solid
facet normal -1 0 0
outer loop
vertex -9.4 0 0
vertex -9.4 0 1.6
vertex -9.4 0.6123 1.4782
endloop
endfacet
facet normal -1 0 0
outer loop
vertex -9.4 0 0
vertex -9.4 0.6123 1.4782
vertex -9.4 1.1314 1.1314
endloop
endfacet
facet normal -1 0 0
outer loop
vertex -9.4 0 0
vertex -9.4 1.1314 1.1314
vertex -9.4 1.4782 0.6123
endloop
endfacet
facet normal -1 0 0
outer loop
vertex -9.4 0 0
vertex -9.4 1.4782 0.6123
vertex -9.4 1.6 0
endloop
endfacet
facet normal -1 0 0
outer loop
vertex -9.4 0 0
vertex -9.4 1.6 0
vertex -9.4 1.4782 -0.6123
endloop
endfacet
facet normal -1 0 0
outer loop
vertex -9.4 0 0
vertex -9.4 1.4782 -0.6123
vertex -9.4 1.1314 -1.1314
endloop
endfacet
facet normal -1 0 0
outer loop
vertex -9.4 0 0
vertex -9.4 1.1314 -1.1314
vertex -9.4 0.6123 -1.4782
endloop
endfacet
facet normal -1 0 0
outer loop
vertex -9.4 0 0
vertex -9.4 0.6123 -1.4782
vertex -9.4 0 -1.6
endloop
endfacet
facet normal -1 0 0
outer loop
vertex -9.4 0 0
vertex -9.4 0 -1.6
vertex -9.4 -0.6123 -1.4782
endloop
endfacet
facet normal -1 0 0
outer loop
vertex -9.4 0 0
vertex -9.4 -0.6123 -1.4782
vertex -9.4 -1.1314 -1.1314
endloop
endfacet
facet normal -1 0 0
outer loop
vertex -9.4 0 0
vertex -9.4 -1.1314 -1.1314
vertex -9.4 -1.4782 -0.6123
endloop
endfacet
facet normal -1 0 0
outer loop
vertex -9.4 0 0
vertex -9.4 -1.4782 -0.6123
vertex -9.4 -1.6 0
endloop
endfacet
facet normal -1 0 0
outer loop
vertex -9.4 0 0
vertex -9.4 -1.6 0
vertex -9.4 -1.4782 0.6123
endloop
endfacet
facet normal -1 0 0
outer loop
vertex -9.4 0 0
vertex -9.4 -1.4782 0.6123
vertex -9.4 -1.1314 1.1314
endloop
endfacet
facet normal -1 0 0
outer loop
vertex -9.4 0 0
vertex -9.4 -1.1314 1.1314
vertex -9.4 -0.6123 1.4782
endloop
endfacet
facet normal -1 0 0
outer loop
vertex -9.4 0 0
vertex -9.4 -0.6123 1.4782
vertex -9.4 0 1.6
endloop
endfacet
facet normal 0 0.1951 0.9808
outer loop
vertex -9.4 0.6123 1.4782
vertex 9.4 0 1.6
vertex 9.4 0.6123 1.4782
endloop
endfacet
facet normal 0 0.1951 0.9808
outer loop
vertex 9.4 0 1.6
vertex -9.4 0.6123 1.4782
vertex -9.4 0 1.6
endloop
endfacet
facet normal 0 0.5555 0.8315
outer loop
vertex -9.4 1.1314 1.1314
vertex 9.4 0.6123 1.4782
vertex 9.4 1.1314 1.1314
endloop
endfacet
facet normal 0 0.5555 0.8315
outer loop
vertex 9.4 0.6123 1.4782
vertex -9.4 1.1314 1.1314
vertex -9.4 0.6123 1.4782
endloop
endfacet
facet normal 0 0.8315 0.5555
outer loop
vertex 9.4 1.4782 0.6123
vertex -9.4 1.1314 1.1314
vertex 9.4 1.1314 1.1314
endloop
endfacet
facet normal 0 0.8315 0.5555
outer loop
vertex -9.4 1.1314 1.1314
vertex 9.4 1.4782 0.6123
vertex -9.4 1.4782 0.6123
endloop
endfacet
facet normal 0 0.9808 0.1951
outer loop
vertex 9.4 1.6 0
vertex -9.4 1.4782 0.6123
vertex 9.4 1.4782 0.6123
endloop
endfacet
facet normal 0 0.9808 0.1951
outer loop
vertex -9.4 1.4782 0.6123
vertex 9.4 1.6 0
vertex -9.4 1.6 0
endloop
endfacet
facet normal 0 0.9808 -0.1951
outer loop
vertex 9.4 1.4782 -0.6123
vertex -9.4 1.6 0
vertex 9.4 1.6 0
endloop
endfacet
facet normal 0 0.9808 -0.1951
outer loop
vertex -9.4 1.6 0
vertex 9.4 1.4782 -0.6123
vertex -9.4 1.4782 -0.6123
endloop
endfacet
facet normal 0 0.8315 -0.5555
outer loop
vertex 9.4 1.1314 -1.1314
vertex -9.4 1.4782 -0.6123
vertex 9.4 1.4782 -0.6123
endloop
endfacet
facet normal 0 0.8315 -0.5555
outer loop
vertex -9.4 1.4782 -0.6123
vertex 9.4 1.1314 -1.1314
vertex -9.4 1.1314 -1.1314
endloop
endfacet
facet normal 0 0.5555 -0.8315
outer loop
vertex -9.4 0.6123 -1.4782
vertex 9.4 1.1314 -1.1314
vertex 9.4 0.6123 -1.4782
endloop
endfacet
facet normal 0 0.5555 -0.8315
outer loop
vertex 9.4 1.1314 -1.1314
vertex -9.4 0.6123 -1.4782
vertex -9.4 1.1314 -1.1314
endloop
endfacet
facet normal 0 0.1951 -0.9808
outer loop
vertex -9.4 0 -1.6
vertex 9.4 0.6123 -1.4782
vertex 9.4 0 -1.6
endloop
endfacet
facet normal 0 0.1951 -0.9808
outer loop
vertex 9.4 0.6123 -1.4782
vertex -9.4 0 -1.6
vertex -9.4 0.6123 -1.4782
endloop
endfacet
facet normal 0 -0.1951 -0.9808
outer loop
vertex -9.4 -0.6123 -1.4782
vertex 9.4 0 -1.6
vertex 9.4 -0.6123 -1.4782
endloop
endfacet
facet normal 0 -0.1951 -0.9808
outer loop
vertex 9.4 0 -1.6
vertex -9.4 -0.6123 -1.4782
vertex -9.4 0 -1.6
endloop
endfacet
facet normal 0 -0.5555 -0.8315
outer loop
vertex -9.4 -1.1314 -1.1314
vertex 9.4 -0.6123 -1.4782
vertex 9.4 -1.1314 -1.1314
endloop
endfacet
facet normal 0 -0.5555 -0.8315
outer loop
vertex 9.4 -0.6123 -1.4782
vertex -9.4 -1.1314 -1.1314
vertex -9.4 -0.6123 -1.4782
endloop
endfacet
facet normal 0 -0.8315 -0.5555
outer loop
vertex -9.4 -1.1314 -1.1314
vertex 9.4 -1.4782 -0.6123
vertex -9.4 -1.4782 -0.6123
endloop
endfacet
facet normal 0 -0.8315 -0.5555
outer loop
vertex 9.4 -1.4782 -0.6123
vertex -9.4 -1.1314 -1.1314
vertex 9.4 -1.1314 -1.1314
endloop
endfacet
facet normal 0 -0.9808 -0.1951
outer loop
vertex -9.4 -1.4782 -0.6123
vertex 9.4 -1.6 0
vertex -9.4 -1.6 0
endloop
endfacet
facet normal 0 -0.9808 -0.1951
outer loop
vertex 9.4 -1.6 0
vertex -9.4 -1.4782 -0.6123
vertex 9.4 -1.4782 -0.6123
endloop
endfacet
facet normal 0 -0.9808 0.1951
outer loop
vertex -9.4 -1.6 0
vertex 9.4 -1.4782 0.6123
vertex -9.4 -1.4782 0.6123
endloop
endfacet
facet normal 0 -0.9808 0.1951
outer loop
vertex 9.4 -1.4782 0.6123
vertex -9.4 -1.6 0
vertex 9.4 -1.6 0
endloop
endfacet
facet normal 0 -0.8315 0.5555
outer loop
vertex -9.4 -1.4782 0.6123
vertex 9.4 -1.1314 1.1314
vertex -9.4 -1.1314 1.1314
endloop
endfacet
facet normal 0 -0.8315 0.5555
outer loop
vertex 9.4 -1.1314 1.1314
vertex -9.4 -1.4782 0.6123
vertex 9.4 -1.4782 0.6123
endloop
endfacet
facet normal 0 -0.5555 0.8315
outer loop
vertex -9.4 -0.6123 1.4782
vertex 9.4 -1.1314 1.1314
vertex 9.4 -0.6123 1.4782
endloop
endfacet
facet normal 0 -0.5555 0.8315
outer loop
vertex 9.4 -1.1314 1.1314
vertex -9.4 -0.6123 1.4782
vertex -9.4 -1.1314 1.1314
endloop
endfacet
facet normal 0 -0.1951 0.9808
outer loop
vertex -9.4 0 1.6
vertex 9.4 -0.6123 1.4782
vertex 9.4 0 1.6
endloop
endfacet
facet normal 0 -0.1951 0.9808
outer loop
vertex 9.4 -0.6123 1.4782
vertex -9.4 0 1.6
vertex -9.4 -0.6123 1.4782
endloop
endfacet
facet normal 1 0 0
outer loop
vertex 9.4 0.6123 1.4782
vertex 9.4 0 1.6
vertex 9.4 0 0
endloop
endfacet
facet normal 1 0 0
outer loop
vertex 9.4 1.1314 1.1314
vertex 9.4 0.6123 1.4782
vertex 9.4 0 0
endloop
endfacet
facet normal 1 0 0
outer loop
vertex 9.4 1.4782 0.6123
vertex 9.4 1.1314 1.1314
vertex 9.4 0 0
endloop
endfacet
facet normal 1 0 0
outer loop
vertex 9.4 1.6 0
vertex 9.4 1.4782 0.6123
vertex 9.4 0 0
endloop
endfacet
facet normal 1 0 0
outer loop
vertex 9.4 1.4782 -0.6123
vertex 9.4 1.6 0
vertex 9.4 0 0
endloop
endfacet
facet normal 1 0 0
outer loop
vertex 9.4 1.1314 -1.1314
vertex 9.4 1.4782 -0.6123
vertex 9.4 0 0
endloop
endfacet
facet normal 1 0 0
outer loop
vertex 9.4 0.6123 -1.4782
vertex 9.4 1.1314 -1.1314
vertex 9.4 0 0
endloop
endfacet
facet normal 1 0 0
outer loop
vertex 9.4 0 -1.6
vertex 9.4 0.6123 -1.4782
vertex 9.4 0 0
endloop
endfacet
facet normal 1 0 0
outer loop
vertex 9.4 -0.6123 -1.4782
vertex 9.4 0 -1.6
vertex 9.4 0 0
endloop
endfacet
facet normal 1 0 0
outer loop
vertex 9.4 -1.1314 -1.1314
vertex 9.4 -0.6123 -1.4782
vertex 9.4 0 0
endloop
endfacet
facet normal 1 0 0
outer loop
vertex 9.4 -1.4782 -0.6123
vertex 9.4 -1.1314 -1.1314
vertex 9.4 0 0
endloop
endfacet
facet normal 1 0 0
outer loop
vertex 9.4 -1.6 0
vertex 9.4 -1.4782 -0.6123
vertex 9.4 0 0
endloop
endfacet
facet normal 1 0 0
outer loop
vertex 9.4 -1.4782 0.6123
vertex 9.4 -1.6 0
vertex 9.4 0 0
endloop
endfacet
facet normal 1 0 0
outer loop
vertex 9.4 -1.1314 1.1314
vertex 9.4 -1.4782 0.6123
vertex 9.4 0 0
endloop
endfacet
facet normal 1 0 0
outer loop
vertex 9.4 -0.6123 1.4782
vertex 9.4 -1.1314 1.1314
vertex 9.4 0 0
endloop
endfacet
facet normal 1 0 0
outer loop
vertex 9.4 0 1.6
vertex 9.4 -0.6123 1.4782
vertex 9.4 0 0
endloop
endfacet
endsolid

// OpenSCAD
// file: ../p/4-4edge.scad
use <../lib.scad>
function ldraw_lib__4_4edge() = [
// 0 Circle 1.0
// 0 Name: 4-4edge.dat
// 0 Author: James Jessiman
// 0 !LDRAW_ORG Primitive UPDATE 2017-01
// 0 !LICENSE Licensed under CC BY 4.0 : see CAreadme.txt
// 
// 0 BFC CERTIFY CCW
  [0,"BFC","CERTIFY"],
  [0,"BFC","CCW"],
// 
// 0 !HISTORY 1998-12-15 [PTadmin] Official Update 1998-10
// 0 !HISTORY 2005-12-28 [PTadmin] Official Update 2005-01
// 0 !HISTORY 2007-06-24 [PTadmin] Header formatted for Contributor Agreement
// 0 !HISTORY 2008-07-01 [PTadmin] Official Update 2008-01
// 0 !HISTORY 2017-01-15 [Steffen] BFCed
// 0 !HISTORY 2017-12-30 [PTadmin] Official Update 2017-01
// 
// 
// 2 24 1 0 0 0.9239 0 0.3827
  [2,24,1,0,0,0.9239,0,0.3827],
// 2 24 0.9239 0 0.3827 0.7071 0 0.7071
  [2,24,0.9239,0,0.3827,0.7071,0,0.7071],
// 2 24 0.7071 0 0.7071 0.3827 0 0.9239
  [2,24,0.7071,0,0.7071,0.3827,0,0.9239],
// 2 24 0.3827 0 0.9239 0 0 1
  [2,24,0.3827,0,0.9239,0,0,1],
// 2 24 0 0 1 -0.3827 0 0.9239
  [2,24,0,0,1,-0.3827,0,0.9239],
// 2 24 -0.3827 0 0.9239 -0.7071 0 0.7071
  [2,24,-0.3827,0,0.9239,-0.7071,0,0.7071],
// 2 24 -0.7071 0 0.7071 -0.9239 0 0.3827
  [2,24,-0.7071,0,0.7071,-0.9239,0,0.3827],
// 2 24 -0.9239 0 0.3827 -1 0 -0
  [2,24,-0.9239,0,0.3827,-1,0,-0],
// 2 24 -1 0 -0 -0.9239 0 -0.3827
  [2,24,-1,0,-0,-0.9239,0,-0.3827],
// 2 24 -0.9239 0 -0.3827 -0.7071 0 -0.7071
  [2,24,-0.9239,0,-0.3827,-0.7071,0,-0.7071],
// 2 24 -0.7071 0 -0.7071 -0.3827 0 -0.9239
  [2,24,-0.7071,0,-0.7071,-0.3827,0,-0.9239],
// 2 24 -0.3827 0 -0.9239 0 0 -1
  [2,24,-0.3827,0,-0.9239,0,0,-1],
// 2 24 0 0 -1 0.3827 0 -0.9239
  [2,24,0,0,-1,0.3827,0,-0.9239],
// 2 24 0.3827 0 -0.9239 0.7071 0 -0.7071
  [2,24,0.3827,0,-0.9239,0.7071,0,-0.7071],
// 2 24 0.7071 0 -0.7071 0.9239 0 -0.3827
  [2,24,0.7071,0,-0.7071,0.9239,0,-0.3827],
// 2 24 0.9239 0 -0.3827 1 0 0
  [2,24,0.9239,0,-0.3827,1,0,0],
];
module ldraw_lib__4_4edge(step=0, col=false, unit=2/5, alt=false, line=0.2, solid=!$preview)
    makepoly(ldraw_lib__4_4edge(), step=step, col=col, unit=unit, alt=alt, line=line, solid=solid);
ldraw_lib__4_4edge(line=0.2);
// file: ../p/4-4cyli.scad
use <../lib.scad>
function ldraw_lib__4_4cyli() = [
// 0 Cylinder 1.0
// 0 Name: 4-4cyli.dat
// 0 Author: James Jessiman
// 0 !LDRAW_ORG Primitive UPDATE 2005-01
// 0 !LICENSE Licensed under CC BY 2.0 and CC BY 4.0 : see CAreadme.txt
// 
// 0 BFC CERTIFY CCW
  [0,"BFC","CERTIFY"],
  [0,"BFC","CCW"],
// 
// 0 !HISTORY 1998-12-15 [PTadmin] Official Update 1998-10
// 0 !HISTORY 2002-03-23 [sbliss] Added BFC statement; merged headers from files in distributions LDraw 0.27 and Complete.
// 0 !HISTORY 2002-04-25 [PTadmin] Official Update 2002-02
// 0 !HISTORY 2004-12-14 [guyvivan] BFC CCW
// 0 !HISTORY 2005-12-28 [PTadmin] Official Update 2005-01
// 0 !HISTORY 2007-06-24 [PTadmin] Header formatted for Contributor Agreement
// 0 !HISTORY 2008-07-01 [PTadmin] Official Update 2008-01
// 
// 
// 4 16 1 1 0 0.9239 1 0.3827 0.9239 0 0.3827 1 0 0
  [4,16,1,1,0,0.9239,1,0.3827,0.9239,0,0.3827,1,0,0],
// 5 24 1 0 0 1 1 0 0.9239 0 0.3827 0.9239 0 -0.3827
  [5,24,1,0,0,1,1,0,0.9239,0,0.3827,0.9239,0,-0.3827],
// 4 16 0.9239 1 0.3827 0.7071 1 0.7071 0.7071 0 0.7071 0.9239 0 0.3827
  [4,16,0.9239,1,0.3827,0.7071,1,0.7071,0.7071,0,0.7071,0.9239,0,0.3827],
// 5 24 0.9239 0 0.3827 0.9239 1 0.3827 0.7071 0 0.7071 1 0 0
  [5,24,0.9239,0,0.3827,0.9239,1,0.3827,0.7071,0,0.7071,1,0,0],
// 4 16 0.7071 1 0.7071 0.3827 1 0.9239 0.3827 0 0.9239 0.7071 0 0.7071
  [4,16,0.7071,1,0.7071,0.3827,1,0.9239,0.3827,0,0.9239,0.7071,0,0.7071],
// 5 24 0.7071 0 0.7071 0.7071 1 0.7071 0.3827 0 0.9239 0.9239 0 0.3827
  [5,24,0.7071,0,0.7071,0.7071,1,0.7071,0.3827,0,0.9239,0.9239,0,0.3827],
// 4 16 0.3827 1 0.9239 0 1 1 0 0 1 0.3827 0 0.9239
  [4,16,0.3827,1,0.9239,0,1,1,0,0,1,0.3827,0,0.9239],
// 5 24 0.3827 0 0.9239 0.3827 1 0.9239 0 0 1 0.7071 0 0.7071
  [5,24,0.3827,0,0.9239,0.3827,1,0.9239,0,0,1,0.7071,0,0.7071],
// 4 16 0 1 1 -0.3827 1 0.9239 -0.3827 0 0.9239 0 0 1
  [4,16,0,1,1,-0.3827,1,0.9239,-0.3827,0,0.9239,0,0,1],
// 5 24 0 0 1 0 1 1 -0.3827 0 0.9239 0.3827 0 0.9239
  [5,24,0,0,1,0,1,1,-0.3827,0,0.9239,0.3827,0,0.9239],
// 4 16 -0.3827 1 0.9239 -0.7071 1 0.7071 -0.7071 0 0.7071 -0.3827 0 0.9239
  [4,16,-0.3827,1,0.9239,-0.7071,1,0.7071,-0.7071,0,0.7071,-0.3827,0,0.9239],
// 5 24 -0.3827 0 0.9239 -0.3827 1 0.9239 -0.7071 0 0.7071 0 0 1
  [5,24,-0.3827,0,0.9239,-0.3827,1,0.9239,-0.7071,0,0.7071,0,0,1],
// 4 16 -0.7071 1 0.7071 -0.9239 1 0.3827 -0.9239 0 0.3827 -0.7071 0 0.7071
  [4,16,-0.7071,1,0.7071,-0.9239,1,0.3827,-0.9239,0,0.3827,-0.7071,0,0.7071],
// 5 24 -0.7071 0 0.7071 -0.7071 1 0.7071 -0.9239 0 0.3827 -0.3827 0 0.9239
  [5,24,-0.7071,0,0.7071,-0.7071,1,0.7071,-0.9239,0,0.3827,-0.3827,0,0.9239],
// 4 16 -0.9239 1 0.3827 -1 1 0 -1 0 0 -0.9239 0 0.3827
  [4,16,-0.9239,1,0.3827,-1,1,0,-1,0,0,-0.9239,0,0.3827],
// 5 24 -0.9239 0 0.3827 -0.9239 1 0.3827 -1 0 0 -0.7071 0 0.7071
  [5,24,-0.9239,0,0.3827,-0.9239,1,0.3827,-1,0,0,-0.7071,0,0.7071],
// 4 16 -1 1 0 -0.9239 1 -0.3827 -0.9239 0 -0.3827 -1 0 0
  [4,16,-1,1,0,-0.9239,1,-0.3827,-0.9239,0,-0.3827,-1,0,0],
// 5 24 -1 0 0 -1 1 0 -0.9239 0 -0.3827 -0.9239 0 0.3827
  [5,24,-1,0,0,-1,1,0,-0.9239,0,-0.3827,-0.9239,0,0.3827],
// 4 16 -0.9239 1 -0.3827 -0.7071 1 -0.7071 -0.7071 0 -0.7071 -0.9239 0 -0.3827
  [4,16,-0.9239,1,-0.3827,-0.7071,1,-0.7071,-0.7071,0,-0.7071,-0.9239,0,-0.3827],
// 5 24 -0.9239 0 -0.3827 -0.9239 1 -0.3827 -0.7071 0 -0.7071 -1 0 0
  [5,24,-0.9239,0,-0.3827,-0.9239,1,-0.3827,-0.7071,0,-0.7071,-1,0,0],
// 4 16 -0.7071 1 -0.7071 -0.3827 1 -0.9239 -0.3827 0 -0.9239 -0.7071 0 -0.7071
  [4,16,-0.7071,1,-0.7071,-0.3827,1,-0.9239,-0.3827,0,-0.9239,-0.7071,0,-0.7071],
// 5 24 -0.7071 0 -0.7071 -0.7071 1 -0.7071 -0.3827 0 -0.9239 -0.9239 0 -0.3827
  [5,24,-0.7071,0,-0.7071,-0.7071,1,-0.7071,-0.3827,0,-0.9239,-0.9239,0,-0.3827],
// 4 16 -0.3827 1 -0.9239 0 1 -1 0 0 -1 -0.3827 0 -0.9239
  [4,16,-0.3827,1,-0.9239,0,1,-1,0,0,-1,-0.3827,0,-0.9239],
// 5 24 -0.3827 0 -0.9239 -0.3827 1 -0.9239 0 0 -1 -0.7071 0 -0.7071
  [5,24,-0.3827,0,-0.9239,-0.3827,1,-0.9239,0,0,-1,-0.7071,0,-0.7071],
// 4 16 0 1 -1 0.3827 1 -0.9239 0.3827 0 -0.9239 0 0 -1
  [4,16,0,1,-1,0.3827,1,-0.9239,0.3827,0,-0.9239,0,0,-1],
// 5 24 0 0 -1 0 1 -1 0.3827 0 -0.9239 -0.3827 0 -0.9239
  [5,24,0,0,-1,0,1,-1,0.3827,0,-0.9239,-0.3827,0,-0.9239],
// 4 16 0.3827 1 -0.9239 0.7071 1 -0.7071 0.7071 0 -0.7071 0.3827 0 -0.9239
  [4,16,0.3827,1,-0.9239,0.7071,1,-0.7071,0.7071,0,-0.7071,0.3827,0,-0.9239],
// 5 24 0.3827 0 -0.9239 0.3827 1 -0.9239 0.7071 0 -0.7071 0 0 -1
  [5,24,0.3827,0,-0.9239,0.3827,1,-0.9239,0.7071,0,-0.7071,0,0,-1],
// 4 16 0.7071 1 -0.7071 0.9239 1 -0.3827 0.9239 0 -0.3827 0.7071 0 -0.7071
  [4,16,0.7071,1,-0.7071,0.9239,1,-0.3827,0.9239,0,-0.3827,0.7071,0,-0.7071],
// 5 24 0.7071 0 -0.7071 0.7071 1 -0.7071 0.9239 0 -0.3827 0.3827 0 -0.9239
  [5,24,0.7071,0,-0.7071,0.7071,1,-0.7071,0.9239,0,-0.3827,0.3827,0,-0.9239],
// 4 16 0.9239 1 -0.3827 1 1 0 1 0 0 0.9239 0 -0.3827
  [4,16,0.9239,1,-0.3827,1,1,0,1,0,0,0.9239,0,-0.3827],
// 5 24 0.9239 0 -0.3827 0.9239 1 -0.3827 1 0 0 0.7071 0 -0.7071
  [5,24,0.9239,0,-0.3827,0.9239,1,-0.3827,1,0,0,0.7071,0,-0.7071],
// 0
];
module ldraw_lib__4_4cyli(step=0, col=false, unit=2/5, alt=false, line=0.2, solid=!$preview)
    makepoly(ldraw_lib__4_4cyli(), step=step, col=col, unit=unit, alt=alt, line=line, solid=solid);
ldraw_lib__4_4cyli(line=0.2);
// file: ../p/4-4disc.scad
use <../lib.scad>
function ldraw_lib__4_4disc() = [
// 0 Disc 1.0
// 0 Name: 4-4disc.dat
// 0 Author: James Jessiman
// 0 !LDRAW_ORG Primitive UPDATE 2002-02
// 0 !LICENSE Licensed under CC BY 4.0 : see CAreadme.txt
// 
// 0 BFC CERTIFY CCW
  [0,"BFC","CERTIFY"],
  [0,"BFC","CCW"],
// 
// 0 !HISTORY 1998-12-15 [PTadmin] Official Update 1998-10
// 0 !HISTORY 2002-03-23 [sbliss] Added BFC statement
// 0 !HISTORY 2002-04-25 [PTadmin] Official Update 2002-02
// 0 !HISTORY 2007-06-24 [PTadmin] Header formatted for Contributor Agreement
// 0 !HISTORY 2008-07-01 [PTadmin] Official Update 2008-01
// 
// 
// 3 16 0 0 0 1 0 0 0.9239 0 0.3827
  [3,16,0,0,0,1,0,0,0.9239,0,0.3827],
// 3 16 0 0 0 0.9239 0 0.3827 0.7071 0 0.7071
  [3,16,0,0,0,0.9239,0,0.3827,0.7071,0,0.7071],
// 3 16 0 0 0 0.7071 0 0.7071 0.3827 0 0.9239
  [3,16,0,0,0,0.7071,0,0.7071,0.3827,0,0.9239],
// 3 16 0 0 0 0.3827 0 0.9239 0 0 1
  [3,16,0,0,0,0.3827,0,0.9239,0,0,1],
// 3 16 0 0 0 0 0 1 -0.3827 0 0.9239
  [3,16,0,0,0,0,0,1,-0.3827,0,0.9239],
// 3 16 0 0 0 -0.3827 0 0.9239 -0.7071 0 0.7071
  [3,16,0,0,0,-0.3827,0,0.9239,-0.7071,0,0.7071],
// 3 16 0 0 0 -0.7071 0 0.7071 -0.9239 0 0.3827
  [3,16,0,0,0,-0.7071,0,0.7071,-0.9239,0,0.3827],
// 3 16 0 0 0 -0.9239 0 0.3827 -1 0 -0
  [3,16,0,0,0,-0.9239,0,0.3827,-1,0,-0],
// 3 16 0 0 0 -1 0 -0 -0.9239 0 -0.3827
  [3,16,0,0,0,-1,0,-0,-0.9239,0,-0.3827],
// 3 16 0 0 0 -0.9239 0 -0.3827 -0.7071 0 -0.7071
  [3,16,0,0,0,-0.9239,0,-0.3827,-0.7071,0,-0.7071],
// 3 16 0 0 0 -0.7071 0 -0.7071 -0.3827 0 -0.9239
  [3,16,0,0,0,-0.7071,0,-0.7071,-0.3827,0,-0.9239],
// 3 16 0 0 0 -0.3827 0 -0.9239 0 0 -1
  [3,16,0,0,0,-0.3827,0,-0.9239,0,0,-1],
// 3 16 0 0 0 0 0 -1 0.3827 0 -0.9239
  [3,16,0,0,0,0,0,-1,0.3827,0,-0.9239],
// 3 16 0 0 0 0.3827 0 -0.9239 0.7071 0 -0.7071
  [3,16,0,0,0,0.3827,0,-0.9239,0.7071,0,-0.7071],
// 3 16 0 0 0 0.7071 0 -0.7071 0.9239 0 -0.3827
  [3,16,0,0,0,0.7071,0,-0.7071,0.9239,0,-0.3827],
// 3 16 0 0 0 0.9239 0 -0.3827 1 0 0
  [3,16,0,0,0,0.9239,0,-0.3827,1,0,0],
// 0
];
module ldraw_lib__4_4disc(step=0, col=false, unit=2/5, alt=false, line=0.2, solid=!$preview)
    makepoly(ldraw_lib__4_4disc(), step=step, col=col, unit=unit, alt=alt, line=line, solid=solid);
ldraw_lib__4_4disc(line=0.2);
// file: ../p/4-4cylc.scad
use <../lib.scad>
use <4-4cyli.scad>
use <4-4disc.scad>
use <4-4edge.scad>
function ldraw_lib__4_4cylc() = [
// 0 Cylinder Closed 1.0
// 0 Name: 4-4cylc.dat
// 0 Author: Alex Taylor [anathema]
// 0 !LDRAW_ORG Primitive UPDATE 2009-02
// 0 !LICENSE Licensed under CC BY 2.0 and CC BY 4.0 : see CAreadme.txt
// 
// 0 BFC CERTIFY CCW
  [0,"BFC","CERTIFY"],
  [0,"BFC","CCW"],
// 
// 0 !HISTORY 2008-12-29 [cwdee] Removed one disc
// 0 !HISTORY 2009-09-03 [PTadmin] Official Update 2009-02
// 
// 
// 1 16 0 0 0 1 0 0 0 1 0 0 0 1 4-4edge.dat
  [1,16,0,0,0,1,0,0,0,1,0,0,0,1, ldraw_lib__4_4edge()],
// 1 16 0 1 0 1 0 0 0 1 0 0 0 1 4-4edge.dat
  [1,16,0,1,0,1,0,0,0,1,0,0,0,1, ldraw_lib__4_4edge()],
// 1 16 0 0 0 1 0 0 0 1 0 0 0 1 4-4disc.dat
  [1,16,0,0,0,1,0,0,0,1,0,0,0,1, ldraw_lib__4_4disc()],
// 1 16 0 0 0 1 0 0 0 1 0 0 0 1 4-4cyli.dat
  [1,16,0,0,0,1,0,0,0,1,0,0,0,1, ldraw_lib__4_4cyli()],
// 0
];
module ldraw_lib__4_4cylc(step=0, col=false, unit=2/5, alt=false, line=0.2, solid=!$preview)
    makepoly(ldraw_lib__4_4cylc(), step=step, col=col, unit=unit, alt=alt, line=line, solid=solid);
ldraw_lib__4_4cylc(line=0.2);
// main file
use <../lib.scad>
use <../p/4-4cylc.scad>
use <../p/4-4disc.scad>
function ldraw_lib__u9103() = [
// 0 Figure Fabuland Hips Hinge
// 0 Name: u9103.dat
// 0 Author: Philippe Hurbain [Philo]
// 0 !LDRAW_ORG Part UPDATE 2010-02
// 0 !LICENSE Licensed under CC BY 4.0 : see CAreadme.txt
// 
// 0 BFC CERTIFY CCW
  [0,"BFC","CERTIFY"],
  [0,"BFC","CCW"],
// 
// 0 !HISTORY 2010-07-05 [PTadmin] Official Update 2010-02
// 
// 
// 1 16 -23.5 0 0 0 47 0 -4 0 0 0 0 4 4-4cylc.dat
  [1,16,-23.5,0,0,0,47,0,-4,0,0,0,0,4, ldraw_lib__4_4cylc()],
// 1 16 23.5 0 0 0 -1 0 -4 0 0 0 0 4 4-4disc.dat
  [1,16,23.5,0,0,0,-1,0,-4,0,0,0,0,4, ldraw_lib__4_4disc()],
];
module ldraw_lib__u9103(step=0, col=false, unit=2/5, alt=false, line=0.2, solid=!$preview)
    makepoly(ldraw_lib__u9103(), step=step, col=col, unit=unit, alt=alt, line=line, solid=solid);
ldraw_lib__u9103(line=0.2);
